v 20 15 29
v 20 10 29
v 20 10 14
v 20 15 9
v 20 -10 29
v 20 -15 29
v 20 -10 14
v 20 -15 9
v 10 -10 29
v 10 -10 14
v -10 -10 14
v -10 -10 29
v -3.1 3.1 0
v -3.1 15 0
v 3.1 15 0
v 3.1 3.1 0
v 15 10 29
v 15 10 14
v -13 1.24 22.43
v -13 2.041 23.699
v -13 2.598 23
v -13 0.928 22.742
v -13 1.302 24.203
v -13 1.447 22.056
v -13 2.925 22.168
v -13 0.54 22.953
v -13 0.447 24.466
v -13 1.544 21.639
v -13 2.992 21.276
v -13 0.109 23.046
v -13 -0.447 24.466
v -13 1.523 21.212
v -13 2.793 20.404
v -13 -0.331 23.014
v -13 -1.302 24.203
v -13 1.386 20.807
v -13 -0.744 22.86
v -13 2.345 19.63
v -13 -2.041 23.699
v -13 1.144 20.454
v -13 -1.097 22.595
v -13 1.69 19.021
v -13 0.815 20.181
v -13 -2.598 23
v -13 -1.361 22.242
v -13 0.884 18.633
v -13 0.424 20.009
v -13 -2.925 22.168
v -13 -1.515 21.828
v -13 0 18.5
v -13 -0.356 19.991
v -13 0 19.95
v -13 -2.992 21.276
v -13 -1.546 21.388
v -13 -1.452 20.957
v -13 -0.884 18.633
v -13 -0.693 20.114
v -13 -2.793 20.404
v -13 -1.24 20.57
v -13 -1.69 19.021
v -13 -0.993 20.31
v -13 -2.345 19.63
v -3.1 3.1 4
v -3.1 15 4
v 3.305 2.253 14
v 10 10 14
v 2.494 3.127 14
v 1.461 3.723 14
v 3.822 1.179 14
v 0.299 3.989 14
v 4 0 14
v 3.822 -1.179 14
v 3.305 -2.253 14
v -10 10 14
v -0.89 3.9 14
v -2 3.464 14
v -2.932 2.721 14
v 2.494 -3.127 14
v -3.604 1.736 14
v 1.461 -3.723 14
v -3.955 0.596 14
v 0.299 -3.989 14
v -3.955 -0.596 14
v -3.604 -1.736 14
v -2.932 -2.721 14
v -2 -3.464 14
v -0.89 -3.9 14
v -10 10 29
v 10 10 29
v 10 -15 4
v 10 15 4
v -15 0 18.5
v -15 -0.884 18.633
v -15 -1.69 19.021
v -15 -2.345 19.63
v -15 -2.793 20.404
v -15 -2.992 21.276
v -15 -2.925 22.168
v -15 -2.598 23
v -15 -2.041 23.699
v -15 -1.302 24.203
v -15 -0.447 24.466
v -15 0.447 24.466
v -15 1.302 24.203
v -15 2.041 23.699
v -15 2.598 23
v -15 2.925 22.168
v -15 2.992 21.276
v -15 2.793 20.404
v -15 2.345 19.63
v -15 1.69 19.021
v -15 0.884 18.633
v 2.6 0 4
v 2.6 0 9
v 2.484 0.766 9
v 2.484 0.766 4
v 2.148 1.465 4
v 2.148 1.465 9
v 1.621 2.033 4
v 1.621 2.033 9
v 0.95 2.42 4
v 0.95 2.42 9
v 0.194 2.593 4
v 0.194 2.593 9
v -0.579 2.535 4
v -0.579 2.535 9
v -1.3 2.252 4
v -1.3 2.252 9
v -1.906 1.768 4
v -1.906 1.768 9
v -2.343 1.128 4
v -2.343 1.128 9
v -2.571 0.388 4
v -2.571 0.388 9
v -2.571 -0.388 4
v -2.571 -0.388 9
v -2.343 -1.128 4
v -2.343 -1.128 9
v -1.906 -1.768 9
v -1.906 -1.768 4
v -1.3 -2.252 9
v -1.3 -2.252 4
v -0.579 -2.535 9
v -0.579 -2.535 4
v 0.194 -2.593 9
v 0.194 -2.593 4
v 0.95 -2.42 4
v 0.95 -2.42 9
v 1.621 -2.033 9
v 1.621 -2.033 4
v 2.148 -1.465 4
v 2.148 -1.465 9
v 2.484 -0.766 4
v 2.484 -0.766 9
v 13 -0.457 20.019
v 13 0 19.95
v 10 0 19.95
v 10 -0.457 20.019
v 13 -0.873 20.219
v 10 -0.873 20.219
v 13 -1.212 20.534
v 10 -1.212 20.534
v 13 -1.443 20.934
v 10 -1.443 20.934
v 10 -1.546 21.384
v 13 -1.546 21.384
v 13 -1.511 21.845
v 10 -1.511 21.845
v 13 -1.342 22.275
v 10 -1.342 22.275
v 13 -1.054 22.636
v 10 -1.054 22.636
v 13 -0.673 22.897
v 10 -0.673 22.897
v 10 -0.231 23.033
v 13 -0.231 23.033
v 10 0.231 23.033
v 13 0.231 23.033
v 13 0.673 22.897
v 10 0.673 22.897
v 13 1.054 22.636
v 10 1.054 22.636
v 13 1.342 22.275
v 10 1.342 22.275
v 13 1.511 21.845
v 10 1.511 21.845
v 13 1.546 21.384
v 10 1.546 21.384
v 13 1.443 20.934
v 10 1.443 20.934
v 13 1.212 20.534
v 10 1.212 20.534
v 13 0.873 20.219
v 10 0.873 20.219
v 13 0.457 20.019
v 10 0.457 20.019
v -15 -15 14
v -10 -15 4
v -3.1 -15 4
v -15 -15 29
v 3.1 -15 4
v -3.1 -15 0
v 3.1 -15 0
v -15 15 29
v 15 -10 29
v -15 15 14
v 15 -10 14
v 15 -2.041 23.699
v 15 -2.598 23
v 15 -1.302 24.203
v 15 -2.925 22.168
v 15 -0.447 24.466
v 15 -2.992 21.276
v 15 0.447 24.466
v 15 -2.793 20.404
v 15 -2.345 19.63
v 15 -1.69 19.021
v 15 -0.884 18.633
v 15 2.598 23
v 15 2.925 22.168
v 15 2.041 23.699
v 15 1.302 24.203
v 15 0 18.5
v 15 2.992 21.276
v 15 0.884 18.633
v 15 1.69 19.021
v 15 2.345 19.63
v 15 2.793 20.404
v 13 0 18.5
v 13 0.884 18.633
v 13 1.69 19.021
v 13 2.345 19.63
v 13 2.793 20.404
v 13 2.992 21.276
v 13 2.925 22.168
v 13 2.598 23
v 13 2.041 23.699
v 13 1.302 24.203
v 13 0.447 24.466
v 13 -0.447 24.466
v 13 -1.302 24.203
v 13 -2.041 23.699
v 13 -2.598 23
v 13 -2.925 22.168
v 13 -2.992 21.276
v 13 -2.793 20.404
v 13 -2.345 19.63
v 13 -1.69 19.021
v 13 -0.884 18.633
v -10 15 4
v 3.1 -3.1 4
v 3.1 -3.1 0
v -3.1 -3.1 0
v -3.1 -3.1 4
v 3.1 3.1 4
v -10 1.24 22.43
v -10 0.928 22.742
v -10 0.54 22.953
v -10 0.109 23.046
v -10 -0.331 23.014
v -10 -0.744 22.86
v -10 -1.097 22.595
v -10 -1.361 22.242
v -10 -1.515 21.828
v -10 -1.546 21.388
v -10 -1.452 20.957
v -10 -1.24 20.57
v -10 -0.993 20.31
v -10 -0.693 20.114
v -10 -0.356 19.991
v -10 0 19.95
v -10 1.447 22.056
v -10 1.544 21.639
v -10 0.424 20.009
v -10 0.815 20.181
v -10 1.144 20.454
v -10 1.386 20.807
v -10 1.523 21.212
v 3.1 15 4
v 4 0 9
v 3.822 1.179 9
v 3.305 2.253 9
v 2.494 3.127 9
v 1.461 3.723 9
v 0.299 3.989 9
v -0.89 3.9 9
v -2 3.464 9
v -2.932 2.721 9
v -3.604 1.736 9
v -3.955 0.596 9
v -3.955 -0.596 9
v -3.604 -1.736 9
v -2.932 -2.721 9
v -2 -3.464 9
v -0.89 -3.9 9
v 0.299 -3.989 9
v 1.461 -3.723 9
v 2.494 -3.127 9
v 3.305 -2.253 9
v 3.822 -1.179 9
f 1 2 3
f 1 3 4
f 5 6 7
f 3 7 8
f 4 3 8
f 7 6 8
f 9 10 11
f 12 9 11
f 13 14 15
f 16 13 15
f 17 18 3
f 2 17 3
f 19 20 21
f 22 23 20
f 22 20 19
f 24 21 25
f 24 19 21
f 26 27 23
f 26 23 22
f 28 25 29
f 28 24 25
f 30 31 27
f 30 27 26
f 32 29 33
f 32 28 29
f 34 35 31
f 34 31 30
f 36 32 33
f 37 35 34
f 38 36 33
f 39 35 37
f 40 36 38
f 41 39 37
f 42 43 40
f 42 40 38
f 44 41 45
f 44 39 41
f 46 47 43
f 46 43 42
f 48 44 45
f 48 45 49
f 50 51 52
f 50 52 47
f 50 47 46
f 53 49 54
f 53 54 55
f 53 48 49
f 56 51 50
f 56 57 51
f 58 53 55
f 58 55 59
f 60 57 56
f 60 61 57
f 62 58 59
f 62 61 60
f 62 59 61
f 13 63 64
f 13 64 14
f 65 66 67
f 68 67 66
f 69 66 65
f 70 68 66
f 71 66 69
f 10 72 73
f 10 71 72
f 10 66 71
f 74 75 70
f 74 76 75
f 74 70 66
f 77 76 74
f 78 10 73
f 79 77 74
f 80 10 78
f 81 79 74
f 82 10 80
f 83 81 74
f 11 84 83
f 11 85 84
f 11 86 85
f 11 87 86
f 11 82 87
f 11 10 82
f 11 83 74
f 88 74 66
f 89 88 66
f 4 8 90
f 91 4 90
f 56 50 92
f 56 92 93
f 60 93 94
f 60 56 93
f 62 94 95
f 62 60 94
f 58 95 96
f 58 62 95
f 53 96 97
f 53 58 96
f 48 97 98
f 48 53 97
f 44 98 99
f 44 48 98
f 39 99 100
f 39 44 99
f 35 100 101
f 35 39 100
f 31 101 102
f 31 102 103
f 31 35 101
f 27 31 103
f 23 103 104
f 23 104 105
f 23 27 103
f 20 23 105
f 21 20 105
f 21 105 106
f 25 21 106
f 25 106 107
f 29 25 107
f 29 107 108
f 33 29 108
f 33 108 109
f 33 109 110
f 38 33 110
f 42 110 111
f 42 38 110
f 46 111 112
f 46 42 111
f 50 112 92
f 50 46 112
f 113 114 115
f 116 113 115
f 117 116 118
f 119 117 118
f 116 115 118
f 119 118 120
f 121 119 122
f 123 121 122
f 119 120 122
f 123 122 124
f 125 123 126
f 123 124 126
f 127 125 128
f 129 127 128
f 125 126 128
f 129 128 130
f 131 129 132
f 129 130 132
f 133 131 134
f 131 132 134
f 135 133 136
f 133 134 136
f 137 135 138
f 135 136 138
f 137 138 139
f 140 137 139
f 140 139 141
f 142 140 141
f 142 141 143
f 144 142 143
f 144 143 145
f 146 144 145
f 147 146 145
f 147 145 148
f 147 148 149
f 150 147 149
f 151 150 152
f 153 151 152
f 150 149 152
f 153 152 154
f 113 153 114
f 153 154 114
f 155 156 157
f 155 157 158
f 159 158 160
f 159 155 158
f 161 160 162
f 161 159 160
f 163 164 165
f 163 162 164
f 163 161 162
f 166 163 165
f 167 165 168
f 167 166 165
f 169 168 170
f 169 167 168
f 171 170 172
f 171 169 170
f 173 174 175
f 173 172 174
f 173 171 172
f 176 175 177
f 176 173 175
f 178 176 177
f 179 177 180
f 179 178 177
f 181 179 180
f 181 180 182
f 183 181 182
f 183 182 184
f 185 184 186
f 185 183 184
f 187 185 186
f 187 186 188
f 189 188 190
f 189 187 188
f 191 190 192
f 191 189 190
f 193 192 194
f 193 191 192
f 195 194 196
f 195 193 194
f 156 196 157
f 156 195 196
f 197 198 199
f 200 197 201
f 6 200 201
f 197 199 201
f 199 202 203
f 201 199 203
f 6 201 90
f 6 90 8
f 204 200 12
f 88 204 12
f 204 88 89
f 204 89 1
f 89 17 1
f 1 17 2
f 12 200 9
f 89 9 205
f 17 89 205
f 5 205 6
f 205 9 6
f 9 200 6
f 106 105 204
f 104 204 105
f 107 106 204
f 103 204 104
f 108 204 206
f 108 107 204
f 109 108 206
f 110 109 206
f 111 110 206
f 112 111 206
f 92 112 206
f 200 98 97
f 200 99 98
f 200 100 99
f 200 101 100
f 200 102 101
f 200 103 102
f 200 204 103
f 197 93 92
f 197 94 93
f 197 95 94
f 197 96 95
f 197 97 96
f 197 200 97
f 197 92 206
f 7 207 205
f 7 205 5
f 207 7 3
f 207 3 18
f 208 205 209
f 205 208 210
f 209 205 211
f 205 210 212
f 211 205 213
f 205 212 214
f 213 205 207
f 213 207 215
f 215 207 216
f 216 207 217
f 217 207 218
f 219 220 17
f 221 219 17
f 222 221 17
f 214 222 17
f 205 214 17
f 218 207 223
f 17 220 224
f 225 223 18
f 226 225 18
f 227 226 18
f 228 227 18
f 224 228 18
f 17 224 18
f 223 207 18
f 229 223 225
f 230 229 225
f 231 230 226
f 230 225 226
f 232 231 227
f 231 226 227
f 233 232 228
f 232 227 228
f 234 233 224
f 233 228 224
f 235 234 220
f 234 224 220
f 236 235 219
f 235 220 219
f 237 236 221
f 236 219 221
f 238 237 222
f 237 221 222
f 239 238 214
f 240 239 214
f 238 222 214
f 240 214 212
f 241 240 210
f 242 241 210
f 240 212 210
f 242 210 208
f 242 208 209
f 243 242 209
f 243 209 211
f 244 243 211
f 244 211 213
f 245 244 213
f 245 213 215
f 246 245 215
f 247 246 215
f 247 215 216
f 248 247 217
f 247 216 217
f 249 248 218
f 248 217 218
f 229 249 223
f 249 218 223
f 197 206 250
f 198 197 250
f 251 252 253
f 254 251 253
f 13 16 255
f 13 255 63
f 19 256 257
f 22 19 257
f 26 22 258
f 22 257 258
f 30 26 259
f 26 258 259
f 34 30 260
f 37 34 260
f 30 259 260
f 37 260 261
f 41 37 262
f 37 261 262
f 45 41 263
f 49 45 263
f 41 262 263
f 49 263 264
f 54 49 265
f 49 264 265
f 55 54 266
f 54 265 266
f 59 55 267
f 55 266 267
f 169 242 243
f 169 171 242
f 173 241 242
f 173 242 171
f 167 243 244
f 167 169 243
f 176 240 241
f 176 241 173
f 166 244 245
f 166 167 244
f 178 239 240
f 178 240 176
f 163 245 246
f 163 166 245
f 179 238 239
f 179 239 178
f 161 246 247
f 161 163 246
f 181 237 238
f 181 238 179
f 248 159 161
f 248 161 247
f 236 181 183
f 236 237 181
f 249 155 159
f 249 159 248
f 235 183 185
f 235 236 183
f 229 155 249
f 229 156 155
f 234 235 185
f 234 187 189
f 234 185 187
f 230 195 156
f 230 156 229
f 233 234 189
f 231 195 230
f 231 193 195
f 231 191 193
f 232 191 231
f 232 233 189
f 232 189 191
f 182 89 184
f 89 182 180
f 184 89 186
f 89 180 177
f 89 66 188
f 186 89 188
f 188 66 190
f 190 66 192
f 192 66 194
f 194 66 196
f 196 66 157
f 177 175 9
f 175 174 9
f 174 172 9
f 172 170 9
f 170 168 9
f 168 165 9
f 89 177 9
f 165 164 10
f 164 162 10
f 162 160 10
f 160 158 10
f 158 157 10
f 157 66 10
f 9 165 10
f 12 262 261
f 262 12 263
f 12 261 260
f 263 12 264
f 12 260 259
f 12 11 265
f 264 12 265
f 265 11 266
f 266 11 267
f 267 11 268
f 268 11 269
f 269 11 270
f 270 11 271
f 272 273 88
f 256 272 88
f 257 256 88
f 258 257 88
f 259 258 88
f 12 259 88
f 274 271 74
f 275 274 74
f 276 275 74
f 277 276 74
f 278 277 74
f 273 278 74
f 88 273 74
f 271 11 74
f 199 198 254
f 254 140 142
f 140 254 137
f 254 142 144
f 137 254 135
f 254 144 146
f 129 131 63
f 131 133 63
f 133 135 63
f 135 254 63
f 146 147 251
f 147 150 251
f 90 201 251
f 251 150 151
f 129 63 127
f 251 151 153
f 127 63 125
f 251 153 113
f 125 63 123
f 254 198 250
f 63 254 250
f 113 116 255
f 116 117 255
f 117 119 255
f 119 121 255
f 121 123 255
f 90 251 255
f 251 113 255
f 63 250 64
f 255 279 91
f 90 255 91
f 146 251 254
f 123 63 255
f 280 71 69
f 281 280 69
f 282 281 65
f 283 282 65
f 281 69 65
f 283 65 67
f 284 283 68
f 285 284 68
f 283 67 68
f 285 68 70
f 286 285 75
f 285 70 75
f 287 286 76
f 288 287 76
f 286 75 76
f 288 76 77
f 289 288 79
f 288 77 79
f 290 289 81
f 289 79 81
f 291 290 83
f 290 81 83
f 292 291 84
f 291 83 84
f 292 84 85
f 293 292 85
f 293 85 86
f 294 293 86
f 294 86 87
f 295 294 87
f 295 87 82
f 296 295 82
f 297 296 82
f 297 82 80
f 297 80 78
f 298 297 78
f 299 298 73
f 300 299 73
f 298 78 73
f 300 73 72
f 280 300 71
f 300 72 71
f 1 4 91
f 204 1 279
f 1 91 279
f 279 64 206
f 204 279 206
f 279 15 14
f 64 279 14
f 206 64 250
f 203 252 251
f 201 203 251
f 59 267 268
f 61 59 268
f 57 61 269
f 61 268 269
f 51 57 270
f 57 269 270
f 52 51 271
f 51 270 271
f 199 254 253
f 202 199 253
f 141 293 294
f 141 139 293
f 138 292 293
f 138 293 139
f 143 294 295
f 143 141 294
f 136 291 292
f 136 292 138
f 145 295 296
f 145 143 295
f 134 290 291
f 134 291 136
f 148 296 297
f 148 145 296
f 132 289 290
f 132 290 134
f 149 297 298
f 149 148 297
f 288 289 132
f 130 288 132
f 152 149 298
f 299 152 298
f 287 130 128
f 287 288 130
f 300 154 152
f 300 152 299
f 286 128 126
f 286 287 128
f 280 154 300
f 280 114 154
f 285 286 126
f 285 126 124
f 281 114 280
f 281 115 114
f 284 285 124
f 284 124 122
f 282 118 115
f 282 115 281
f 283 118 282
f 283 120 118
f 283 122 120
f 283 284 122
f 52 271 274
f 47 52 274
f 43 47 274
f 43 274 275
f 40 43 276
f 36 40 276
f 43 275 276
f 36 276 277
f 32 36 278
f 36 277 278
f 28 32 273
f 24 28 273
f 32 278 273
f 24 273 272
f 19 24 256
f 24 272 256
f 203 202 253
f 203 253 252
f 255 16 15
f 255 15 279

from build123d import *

# Parameters (mm, degrees)
EXTRUDE_1_DEPTH      = 14
CUT_EXTRUDE_1_DEPTH  = 44
SKETCH_3_W           = 6.2
SKETCH_3_H           = 6.2
CUT_EXTRUDE_2_DEPTH  = 4
SKETCH_4_R           = 4
CUT_EXTRUDE_3_DEPTH  = 5
SKETCH_5_R           = 2.6
CUT_EXTRUDE_4_DEPTH  = 5
EXTRUDE_2_DEPTH      = 44
SKETCH_8_W           = 5
SKETCH_8_H           = 5
EXTRUDE_4_DEPTH      = 15
SKETCH_9_W           = 35
SKETCH_9_H           = 5
EXTRUDE_5_DEPTH      = 7
CUT_EXTRUDE_6_DEPTH  = 10
CUT_EXTRUDE_START    = -30
SKETCH_14_R          = 1.55
CUT_EXTRUDE_7_DEPTH  = 30
SKETCH_15_R          = 3
CUT_EXTRUDE_8_DEPTH  = 2
CUT_EXTRUDE_START_2  = -2
SKETCH_16_R          = 3
CUT_EXTRUDE_9_DEPTH  = 2
SKETCH_17_W          = 35
SKETCH_17_H          = 7
CUT_EXTRUDE_10_DEPTH = 10
SKETCH_18_W          = 35
SKETCH_18_H          = 7
CUT_EXTRUDE_11_DEPTH = 20


with BuildPart() as part:
    # 草图1 → 凸台-拉伸1 (new body)
    with BuildSketch(Plane.XY):
        Polygon((-15, 22), (-15, -22), (15, -22), (15, 22), (0, 22), align=None)
    extrude(amount=EXTRUDE_1_DEPTH)

    # 草图2 → 切除-拉伸1 (cut)
    with BuildSketch(Plane(origin=(0, 22, 0), x_dir=(1, 0, 0), z_dir=(0, 1, 0))):
        Polygon((-15, 0), (-15, -14), (-10, -4), (-3.1, -4), (-3.1, 0), align=None)
        Polygon((3.1, -4), (10, -4), (15, -14), (15, 0), (3.1, 0), align=None)
    extrude(amount=-CUT_EXTRUDE_1_DEPTH, mode=Mode.SUBTRACT)

    # 草图3 → 切除-拉伸2 (cut)
    with BuildSketch(Plane(origin=(0, 0, 0), x_dir=(-1, 0, 0), z_dir=(0, 0, -1))):
        Rectangle(SKETCH_3_W, SKETCH_3_H)
    extrude(amount=-CUT_EXTRUDE_2_DEPTH, mode=Mode.SUBTRACT)

    # 草图4 → 切除-拉伸3 (cut)
    with BuildSketch(Plane.XY.offset(14)):
        Circle(SKETCH_4_R)
    extrude(amount=-CUT_EXTRUDE_3_DEPTH, mode=Mode.SUBTRACT)

    # 草图5 → 切除-拉伸4 (cut)
    with BuildSketch(Plane.XY.offset(9)):
        Circle(SKETCH_5_R)
    extrude(amount=-CUT_EXTRUDE_4_DEPTH, mode=Mode.SUBTRACT)

    # 草图7 → 凸台-拉伸2 (add)
    with BuildSketch(Plane.XZ.offset(22)):
        Polygon((15, 14), (20, 14), (20, 9), (10, 4), (10, 14), align=None)
    extrude(amount=-EXTRUDE_2_DEPTH)

    # 草图8 → 凸台-拉伸4 (add)
    with BuildSketch(Plane.XY.offset(14)):
        with Locations((-12.5, -12.5)):
            Rectangle(SKETCH_8_W, SKETCH_8_H)
        Polygon((-10, -10), (-10, -15), (10, -15), (10, -10), (0, -10), align=None)
        Polygon((-10, 0), (-10, 10), (-15, 10), (-15, -10), (-10, -10), align=None)
        with Locations((-12.5, 12.5)):
            Rectangle(SKETCH_8_W, SKETCH_8_H)
        Polygon((-10, 15), (10, 15), (10, 10), (0, 10), (-10, 10), align=None)
        with Locations((12.5, 12.5)):
            Rectangle(SKETCH_8_W, SKETCH_8_H)
        Polygon((15, 10), (15, -10), (10, -10), (10, 0), (10, 10), align=None)
        with Locations((12.5, -12.5)):
            Rectangle(SKETCH_8_W, SKETCH_8_H)
        with Locations((17.5, -12.5)):
            Rectangle(SKETCH_8_W, SKETCH_8_H)
        with Locations((17.5, 12.5)):
            Rectangle(SKETCH_8_W, SKETCH_8_H)
    extrude(amount=EXTRUDE_4_DEPTH)

    # 草图9 → 凸台-拉伸5 (add)
    with BuildSketch(Plane(origin=(0, 15, 0), x_dir=(1, 0, 0), z_dir=(0, 1, 0))):
        with Locations((2.5, -26.5)):
            Rectangle(SKETCH_9_W, SKETCH_9_H)
    extrude(amount=EXTRUDE_5_DEPTH)

    # 草图13 → 切除-拉伸6 (cut)
    with BuildSketch(Plane(origin=(-10, 0, 0), x_dir=(0, 0, -1), z_dir=(1, 0, 0))):
        with BuildLine():
            ThreePointArc((-19.95, 0), (-20.806818927, 1.386362146), (-22.43, 1.24))
            Line((-22.43, 1.24), (-20.57, -1.24))
            ThreePointArc((-20.57, -1.24), (-20.113637854, -0.693181073), (-19.95, 0))
        make_face()
        with BuildLine():
            Line((-20.57, -1.24), (-22.43, 1.24))
            ThreePointArc((-22.43, 1.24), (-22.74, -0.93), (-20.57, -1.24))
        make_face()
    extrude(amount=-CUT_EXTRUDE_6_DEPTH, mode=Mode.SUBTRACT)

    # 草图14 → 切除-拉伸7 (cut)
    with BuildSketch(Plane.ZY.offset(15).offset(CUT_EXTRUDE_START)):
        with Locations(Location((21.5, 0, 0), (0, 0, 180))):
            Circle(SKETCH_14_R)
    extrude(amount=CUT_EXTRUDE_7_DEPTH, mode=Mode.SUBTRACT)

    # 草图15 → 切除-拉伸8 (cut)
    with BuildSketch(Plane(origin=(15, 0, 0), x_dir=(0, 0, -1), z_dir=(1, 0, 0))):
        with Locations((-21.5, 0)):
            Circle(SKETCH_15_R)
    extrude(amount=-CUT_EXTRUDE_8_DEPTH, mode=Mode.SUBTRACT)

    # 草图16 → 切除-拉伸9 (cut)
    with BuildSketch(Plane.ZY.offset(15).offset(CUT_EXTRUDE_START_2)):
        with Locations(Location((21.5, 0, 0), (0, 0, 180))):
            Circle(SKETCH_16_R)
    extrude(amount=CUT_EXTRUDE_9_DEPTH, mode=Mode.SUBTRACT)

    # 草图17 → 切除-拉伸10 (cut)
    with BuildSketch(Plane.XY.offset(29)):
        with Locations((2.5, 18.5)):
            Rectangle(SKETCH_17_W, SKETCH_17_H)
    extrude(amount=-CUT_EXTRUDE_10_DEPTH, mode=Mode.SUBTRACT)

    # 草图18 → 切除-拉伸11 (cut)
    with BuildSketch(Plane.XY.offset(14)):
        with Locations((2.5, 18.5)):
            Rectangle(SKETCH_18_W, SKETCH_18_H)
        with Locations((2.5, -18.5)):
            Rectangle(SKETCH_18_W, SKETCH_18_H)
    extrude(amount=-CUT_EXTRUDE_11_DEPTH, mode=Mode.SUBTRACT)


solid = part.part
